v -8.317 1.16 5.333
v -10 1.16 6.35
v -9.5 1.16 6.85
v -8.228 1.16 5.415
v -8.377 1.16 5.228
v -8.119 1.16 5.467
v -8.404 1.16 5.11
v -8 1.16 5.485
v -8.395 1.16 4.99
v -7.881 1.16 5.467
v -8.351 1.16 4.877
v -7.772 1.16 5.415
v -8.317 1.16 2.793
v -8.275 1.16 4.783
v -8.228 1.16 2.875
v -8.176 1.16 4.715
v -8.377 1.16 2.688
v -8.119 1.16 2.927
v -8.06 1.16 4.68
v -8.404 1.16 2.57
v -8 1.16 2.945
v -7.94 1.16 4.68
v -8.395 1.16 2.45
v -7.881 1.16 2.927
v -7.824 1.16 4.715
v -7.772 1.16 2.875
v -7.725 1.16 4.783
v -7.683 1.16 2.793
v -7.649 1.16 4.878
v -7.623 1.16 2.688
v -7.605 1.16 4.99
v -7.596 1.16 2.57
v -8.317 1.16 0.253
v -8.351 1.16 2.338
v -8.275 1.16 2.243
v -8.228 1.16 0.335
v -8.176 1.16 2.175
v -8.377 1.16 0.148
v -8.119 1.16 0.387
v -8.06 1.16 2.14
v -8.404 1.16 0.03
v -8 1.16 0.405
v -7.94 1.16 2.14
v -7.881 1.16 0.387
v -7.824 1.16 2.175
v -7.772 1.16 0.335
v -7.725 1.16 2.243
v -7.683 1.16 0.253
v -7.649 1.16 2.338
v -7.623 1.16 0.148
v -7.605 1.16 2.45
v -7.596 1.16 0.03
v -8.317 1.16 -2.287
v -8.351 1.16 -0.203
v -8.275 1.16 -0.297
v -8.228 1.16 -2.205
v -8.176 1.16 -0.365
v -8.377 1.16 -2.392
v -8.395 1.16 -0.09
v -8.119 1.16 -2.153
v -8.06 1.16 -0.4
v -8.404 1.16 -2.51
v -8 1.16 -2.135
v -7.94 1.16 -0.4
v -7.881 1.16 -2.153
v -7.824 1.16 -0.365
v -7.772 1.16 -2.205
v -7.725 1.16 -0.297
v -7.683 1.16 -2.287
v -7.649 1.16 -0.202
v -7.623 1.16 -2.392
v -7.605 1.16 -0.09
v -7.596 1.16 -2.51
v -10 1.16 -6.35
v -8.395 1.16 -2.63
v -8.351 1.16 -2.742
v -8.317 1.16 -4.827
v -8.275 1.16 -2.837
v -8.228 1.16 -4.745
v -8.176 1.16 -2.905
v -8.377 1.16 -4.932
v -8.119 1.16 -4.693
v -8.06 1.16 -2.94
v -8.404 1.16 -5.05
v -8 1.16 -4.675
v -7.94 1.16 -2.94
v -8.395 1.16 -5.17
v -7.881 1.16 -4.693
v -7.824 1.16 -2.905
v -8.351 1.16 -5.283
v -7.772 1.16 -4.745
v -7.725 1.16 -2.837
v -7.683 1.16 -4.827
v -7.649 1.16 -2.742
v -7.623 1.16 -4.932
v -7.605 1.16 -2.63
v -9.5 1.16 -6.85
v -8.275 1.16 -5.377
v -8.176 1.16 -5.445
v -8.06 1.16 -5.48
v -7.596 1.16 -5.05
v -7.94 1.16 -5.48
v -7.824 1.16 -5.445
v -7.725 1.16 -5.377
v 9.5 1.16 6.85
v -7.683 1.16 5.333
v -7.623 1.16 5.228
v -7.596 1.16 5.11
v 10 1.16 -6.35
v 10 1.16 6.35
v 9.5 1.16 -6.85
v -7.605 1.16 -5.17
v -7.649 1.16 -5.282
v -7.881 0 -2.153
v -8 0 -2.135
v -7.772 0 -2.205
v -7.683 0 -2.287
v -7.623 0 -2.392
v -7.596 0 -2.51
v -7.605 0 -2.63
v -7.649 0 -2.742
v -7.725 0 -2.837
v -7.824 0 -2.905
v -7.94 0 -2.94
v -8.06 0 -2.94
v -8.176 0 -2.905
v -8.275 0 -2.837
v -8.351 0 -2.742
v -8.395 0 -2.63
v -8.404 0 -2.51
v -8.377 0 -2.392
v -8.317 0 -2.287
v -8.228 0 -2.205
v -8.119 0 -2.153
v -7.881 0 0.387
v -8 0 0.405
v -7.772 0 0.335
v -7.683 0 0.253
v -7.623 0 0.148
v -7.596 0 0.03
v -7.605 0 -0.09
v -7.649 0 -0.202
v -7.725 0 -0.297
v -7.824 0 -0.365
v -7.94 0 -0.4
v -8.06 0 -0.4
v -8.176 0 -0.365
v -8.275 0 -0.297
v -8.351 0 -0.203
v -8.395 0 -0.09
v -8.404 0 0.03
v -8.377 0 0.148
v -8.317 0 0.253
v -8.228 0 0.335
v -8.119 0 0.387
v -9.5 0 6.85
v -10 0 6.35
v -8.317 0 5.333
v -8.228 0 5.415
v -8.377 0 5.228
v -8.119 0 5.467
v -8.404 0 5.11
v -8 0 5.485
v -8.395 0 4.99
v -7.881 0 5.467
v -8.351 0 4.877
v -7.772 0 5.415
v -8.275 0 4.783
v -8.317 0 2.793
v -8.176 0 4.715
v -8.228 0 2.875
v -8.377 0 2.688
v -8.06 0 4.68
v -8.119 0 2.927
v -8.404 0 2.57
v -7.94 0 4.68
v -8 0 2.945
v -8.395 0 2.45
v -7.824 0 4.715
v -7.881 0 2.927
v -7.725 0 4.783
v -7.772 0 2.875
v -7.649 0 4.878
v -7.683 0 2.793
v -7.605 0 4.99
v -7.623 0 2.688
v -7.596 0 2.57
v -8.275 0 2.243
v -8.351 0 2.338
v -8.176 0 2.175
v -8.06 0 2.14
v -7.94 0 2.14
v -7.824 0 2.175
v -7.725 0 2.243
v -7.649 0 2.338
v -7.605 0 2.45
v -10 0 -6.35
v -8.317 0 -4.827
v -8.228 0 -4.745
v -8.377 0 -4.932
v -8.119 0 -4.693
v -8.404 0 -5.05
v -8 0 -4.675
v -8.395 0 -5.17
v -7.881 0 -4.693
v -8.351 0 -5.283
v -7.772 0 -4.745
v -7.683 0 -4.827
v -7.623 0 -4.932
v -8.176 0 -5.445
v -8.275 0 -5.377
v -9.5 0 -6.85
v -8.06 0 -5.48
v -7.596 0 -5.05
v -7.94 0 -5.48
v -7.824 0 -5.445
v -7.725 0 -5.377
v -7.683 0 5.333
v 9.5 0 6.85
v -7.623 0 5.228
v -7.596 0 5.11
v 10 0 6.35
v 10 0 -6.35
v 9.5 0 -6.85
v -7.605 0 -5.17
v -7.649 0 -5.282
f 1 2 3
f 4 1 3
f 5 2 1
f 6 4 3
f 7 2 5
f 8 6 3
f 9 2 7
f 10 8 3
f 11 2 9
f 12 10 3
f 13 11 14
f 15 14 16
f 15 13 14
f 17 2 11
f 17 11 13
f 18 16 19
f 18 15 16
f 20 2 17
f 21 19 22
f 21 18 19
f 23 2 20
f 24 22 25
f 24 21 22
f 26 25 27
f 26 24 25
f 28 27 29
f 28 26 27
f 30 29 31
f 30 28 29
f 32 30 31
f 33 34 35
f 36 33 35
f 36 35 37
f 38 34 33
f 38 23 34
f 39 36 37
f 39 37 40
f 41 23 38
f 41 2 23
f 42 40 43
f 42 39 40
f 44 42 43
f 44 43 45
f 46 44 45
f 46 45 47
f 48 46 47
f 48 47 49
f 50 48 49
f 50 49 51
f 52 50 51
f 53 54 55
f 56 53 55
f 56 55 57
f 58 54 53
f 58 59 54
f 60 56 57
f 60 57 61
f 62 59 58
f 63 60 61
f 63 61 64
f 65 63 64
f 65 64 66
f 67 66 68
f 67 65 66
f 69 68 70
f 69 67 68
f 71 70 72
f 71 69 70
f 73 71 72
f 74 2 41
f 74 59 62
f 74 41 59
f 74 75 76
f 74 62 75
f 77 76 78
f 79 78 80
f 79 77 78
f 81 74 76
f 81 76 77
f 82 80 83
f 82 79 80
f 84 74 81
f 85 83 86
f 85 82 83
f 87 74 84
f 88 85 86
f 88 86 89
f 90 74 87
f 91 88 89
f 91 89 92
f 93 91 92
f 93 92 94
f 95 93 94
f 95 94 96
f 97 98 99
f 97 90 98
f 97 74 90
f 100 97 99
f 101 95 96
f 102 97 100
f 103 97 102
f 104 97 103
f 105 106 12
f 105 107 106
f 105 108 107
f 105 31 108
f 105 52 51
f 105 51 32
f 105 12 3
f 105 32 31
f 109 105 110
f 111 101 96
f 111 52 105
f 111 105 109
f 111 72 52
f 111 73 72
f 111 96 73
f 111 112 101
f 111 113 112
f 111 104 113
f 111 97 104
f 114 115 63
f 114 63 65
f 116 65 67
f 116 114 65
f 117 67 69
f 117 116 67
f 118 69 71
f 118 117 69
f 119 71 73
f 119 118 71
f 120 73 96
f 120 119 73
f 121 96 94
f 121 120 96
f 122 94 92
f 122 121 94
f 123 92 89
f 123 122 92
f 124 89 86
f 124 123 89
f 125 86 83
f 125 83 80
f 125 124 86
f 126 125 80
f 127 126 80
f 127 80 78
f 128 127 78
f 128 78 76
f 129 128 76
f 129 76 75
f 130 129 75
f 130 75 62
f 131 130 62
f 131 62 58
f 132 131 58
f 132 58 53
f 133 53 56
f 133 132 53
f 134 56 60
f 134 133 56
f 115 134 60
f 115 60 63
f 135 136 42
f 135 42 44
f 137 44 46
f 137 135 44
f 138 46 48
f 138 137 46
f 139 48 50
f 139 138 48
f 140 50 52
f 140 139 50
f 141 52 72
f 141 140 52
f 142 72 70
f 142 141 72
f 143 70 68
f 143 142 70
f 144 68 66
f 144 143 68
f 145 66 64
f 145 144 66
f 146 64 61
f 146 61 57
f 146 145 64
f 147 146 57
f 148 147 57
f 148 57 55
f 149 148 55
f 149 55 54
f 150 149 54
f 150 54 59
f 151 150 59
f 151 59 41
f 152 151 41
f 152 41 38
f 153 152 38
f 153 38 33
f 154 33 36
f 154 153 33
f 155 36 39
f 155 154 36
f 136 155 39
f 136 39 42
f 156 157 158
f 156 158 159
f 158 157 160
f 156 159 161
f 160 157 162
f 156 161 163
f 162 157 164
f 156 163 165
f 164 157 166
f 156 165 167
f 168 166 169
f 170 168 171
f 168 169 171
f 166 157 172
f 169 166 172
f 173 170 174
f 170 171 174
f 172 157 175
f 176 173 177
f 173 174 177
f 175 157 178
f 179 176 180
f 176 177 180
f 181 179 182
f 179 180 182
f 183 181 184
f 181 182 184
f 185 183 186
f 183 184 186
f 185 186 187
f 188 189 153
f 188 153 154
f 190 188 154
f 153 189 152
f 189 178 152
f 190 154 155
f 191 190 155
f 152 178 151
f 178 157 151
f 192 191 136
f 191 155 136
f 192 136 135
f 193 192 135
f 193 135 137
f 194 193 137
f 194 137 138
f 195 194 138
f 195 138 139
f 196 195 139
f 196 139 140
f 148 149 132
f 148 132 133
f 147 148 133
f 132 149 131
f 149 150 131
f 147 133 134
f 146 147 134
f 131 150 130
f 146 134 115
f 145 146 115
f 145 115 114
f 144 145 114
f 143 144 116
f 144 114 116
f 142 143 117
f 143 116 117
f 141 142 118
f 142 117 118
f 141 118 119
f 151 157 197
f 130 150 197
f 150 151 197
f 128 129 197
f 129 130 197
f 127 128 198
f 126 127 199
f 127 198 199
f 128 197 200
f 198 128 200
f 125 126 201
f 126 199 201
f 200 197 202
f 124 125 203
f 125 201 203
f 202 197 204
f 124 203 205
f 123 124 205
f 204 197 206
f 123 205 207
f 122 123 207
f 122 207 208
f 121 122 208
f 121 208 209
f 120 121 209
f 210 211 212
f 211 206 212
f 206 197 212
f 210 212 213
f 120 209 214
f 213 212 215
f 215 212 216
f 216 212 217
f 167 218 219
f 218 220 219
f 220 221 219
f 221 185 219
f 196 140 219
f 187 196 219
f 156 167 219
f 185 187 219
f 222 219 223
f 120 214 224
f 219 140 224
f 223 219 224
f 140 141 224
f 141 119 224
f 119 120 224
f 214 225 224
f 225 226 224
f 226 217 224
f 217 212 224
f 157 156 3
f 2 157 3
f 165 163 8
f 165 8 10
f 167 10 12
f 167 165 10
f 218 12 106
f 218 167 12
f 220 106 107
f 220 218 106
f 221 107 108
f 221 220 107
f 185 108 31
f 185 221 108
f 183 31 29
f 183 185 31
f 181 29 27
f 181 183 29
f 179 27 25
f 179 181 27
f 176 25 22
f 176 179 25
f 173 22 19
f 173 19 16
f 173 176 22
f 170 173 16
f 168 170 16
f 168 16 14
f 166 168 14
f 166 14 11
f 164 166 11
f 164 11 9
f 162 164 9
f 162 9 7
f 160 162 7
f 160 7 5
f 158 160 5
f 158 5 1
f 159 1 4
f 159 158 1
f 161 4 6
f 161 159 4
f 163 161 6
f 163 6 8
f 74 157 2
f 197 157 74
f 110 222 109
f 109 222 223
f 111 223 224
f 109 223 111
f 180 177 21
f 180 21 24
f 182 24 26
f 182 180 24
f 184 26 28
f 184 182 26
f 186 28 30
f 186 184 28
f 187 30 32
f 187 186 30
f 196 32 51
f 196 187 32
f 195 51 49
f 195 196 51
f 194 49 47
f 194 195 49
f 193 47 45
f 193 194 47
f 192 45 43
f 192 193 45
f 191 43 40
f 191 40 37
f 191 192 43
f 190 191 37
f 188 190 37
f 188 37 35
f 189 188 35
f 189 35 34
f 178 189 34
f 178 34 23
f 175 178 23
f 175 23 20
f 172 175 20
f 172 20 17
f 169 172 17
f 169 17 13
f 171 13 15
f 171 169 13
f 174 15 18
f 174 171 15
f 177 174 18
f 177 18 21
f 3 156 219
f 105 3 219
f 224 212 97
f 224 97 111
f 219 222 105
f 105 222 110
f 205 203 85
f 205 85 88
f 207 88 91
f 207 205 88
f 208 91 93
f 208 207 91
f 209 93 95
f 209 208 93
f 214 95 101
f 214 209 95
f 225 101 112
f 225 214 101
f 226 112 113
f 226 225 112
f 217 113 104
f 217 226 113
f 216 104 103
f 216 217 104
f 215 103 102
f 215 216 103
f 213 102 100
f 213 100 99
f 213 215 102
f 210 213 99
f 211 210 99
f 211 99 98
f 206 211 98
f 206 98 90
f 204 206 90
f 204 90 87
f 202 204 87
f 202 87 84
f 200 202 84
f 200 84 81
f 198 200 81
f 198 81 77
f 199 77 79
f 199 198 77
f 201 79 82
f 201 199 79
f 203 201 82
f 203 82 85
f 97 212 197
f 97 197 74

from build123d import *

# Parameters (mm, degrees)
SKETCH1_W           = 20
SKETCH1_H           = 13.7
SKETCH1_R           = 0.405
BOSS_EXTRUDE1_DEPTH = 1.16
CHAMFER1_SIZE       = 0.5


with BuildPart() as part:
    # Sketch1 → Boss-Extrude1 (new body)
    with BuildSketch(Plane(origin=(0, 0, 0), x_dir=(1, 0, 0), z_dir=(0, 1, 0))):
        Rectangle(SKETCH1_W, SKETCH1_H)
        with Locations(Location((-8, -5.08, 0), (0, 0, 270))):
            Circle(SKETCH1_R, mode=Mode.SUBTRACT)
        with Locations(Location((-8, -2.54, 0), (0, 0, 270))):
            Circle(SKETCH1_R, mode=Mode.SUBTRACT)
        with Locations(Location((-8, 0, 0), (0, 0, 270))):
            Circle(SKETCH1_R, mode=Mode.SUBTRACT)
        with Locations(Location((-8, 2.54, 0), (0, 0, 270))):
            Circle(SKETCH1_R, mode=Mode.SUBTRACT)
        with Locations(Location((-8, 5.08, 0), (0, 0, 270))):
            Circle(SKETCH1_R, mode=Mode.SUBTRACT)
    extrude(amount=BOSS_EXTRUDE1_DEPTH)

    # Chamfer1
    chamfer1_edges = [part.edges().sort_by_distance(p)[0] for p in [
        (-10, 0.58, -6.85),
        (10, 0.58, -6.85),
        (10, 0.58, 6.85),
        (-10, 0.58, 6.85),
    ]]
    chamfer(chamfer1_edges, length=CHAMFER1_SIZE)


solid = part.part
